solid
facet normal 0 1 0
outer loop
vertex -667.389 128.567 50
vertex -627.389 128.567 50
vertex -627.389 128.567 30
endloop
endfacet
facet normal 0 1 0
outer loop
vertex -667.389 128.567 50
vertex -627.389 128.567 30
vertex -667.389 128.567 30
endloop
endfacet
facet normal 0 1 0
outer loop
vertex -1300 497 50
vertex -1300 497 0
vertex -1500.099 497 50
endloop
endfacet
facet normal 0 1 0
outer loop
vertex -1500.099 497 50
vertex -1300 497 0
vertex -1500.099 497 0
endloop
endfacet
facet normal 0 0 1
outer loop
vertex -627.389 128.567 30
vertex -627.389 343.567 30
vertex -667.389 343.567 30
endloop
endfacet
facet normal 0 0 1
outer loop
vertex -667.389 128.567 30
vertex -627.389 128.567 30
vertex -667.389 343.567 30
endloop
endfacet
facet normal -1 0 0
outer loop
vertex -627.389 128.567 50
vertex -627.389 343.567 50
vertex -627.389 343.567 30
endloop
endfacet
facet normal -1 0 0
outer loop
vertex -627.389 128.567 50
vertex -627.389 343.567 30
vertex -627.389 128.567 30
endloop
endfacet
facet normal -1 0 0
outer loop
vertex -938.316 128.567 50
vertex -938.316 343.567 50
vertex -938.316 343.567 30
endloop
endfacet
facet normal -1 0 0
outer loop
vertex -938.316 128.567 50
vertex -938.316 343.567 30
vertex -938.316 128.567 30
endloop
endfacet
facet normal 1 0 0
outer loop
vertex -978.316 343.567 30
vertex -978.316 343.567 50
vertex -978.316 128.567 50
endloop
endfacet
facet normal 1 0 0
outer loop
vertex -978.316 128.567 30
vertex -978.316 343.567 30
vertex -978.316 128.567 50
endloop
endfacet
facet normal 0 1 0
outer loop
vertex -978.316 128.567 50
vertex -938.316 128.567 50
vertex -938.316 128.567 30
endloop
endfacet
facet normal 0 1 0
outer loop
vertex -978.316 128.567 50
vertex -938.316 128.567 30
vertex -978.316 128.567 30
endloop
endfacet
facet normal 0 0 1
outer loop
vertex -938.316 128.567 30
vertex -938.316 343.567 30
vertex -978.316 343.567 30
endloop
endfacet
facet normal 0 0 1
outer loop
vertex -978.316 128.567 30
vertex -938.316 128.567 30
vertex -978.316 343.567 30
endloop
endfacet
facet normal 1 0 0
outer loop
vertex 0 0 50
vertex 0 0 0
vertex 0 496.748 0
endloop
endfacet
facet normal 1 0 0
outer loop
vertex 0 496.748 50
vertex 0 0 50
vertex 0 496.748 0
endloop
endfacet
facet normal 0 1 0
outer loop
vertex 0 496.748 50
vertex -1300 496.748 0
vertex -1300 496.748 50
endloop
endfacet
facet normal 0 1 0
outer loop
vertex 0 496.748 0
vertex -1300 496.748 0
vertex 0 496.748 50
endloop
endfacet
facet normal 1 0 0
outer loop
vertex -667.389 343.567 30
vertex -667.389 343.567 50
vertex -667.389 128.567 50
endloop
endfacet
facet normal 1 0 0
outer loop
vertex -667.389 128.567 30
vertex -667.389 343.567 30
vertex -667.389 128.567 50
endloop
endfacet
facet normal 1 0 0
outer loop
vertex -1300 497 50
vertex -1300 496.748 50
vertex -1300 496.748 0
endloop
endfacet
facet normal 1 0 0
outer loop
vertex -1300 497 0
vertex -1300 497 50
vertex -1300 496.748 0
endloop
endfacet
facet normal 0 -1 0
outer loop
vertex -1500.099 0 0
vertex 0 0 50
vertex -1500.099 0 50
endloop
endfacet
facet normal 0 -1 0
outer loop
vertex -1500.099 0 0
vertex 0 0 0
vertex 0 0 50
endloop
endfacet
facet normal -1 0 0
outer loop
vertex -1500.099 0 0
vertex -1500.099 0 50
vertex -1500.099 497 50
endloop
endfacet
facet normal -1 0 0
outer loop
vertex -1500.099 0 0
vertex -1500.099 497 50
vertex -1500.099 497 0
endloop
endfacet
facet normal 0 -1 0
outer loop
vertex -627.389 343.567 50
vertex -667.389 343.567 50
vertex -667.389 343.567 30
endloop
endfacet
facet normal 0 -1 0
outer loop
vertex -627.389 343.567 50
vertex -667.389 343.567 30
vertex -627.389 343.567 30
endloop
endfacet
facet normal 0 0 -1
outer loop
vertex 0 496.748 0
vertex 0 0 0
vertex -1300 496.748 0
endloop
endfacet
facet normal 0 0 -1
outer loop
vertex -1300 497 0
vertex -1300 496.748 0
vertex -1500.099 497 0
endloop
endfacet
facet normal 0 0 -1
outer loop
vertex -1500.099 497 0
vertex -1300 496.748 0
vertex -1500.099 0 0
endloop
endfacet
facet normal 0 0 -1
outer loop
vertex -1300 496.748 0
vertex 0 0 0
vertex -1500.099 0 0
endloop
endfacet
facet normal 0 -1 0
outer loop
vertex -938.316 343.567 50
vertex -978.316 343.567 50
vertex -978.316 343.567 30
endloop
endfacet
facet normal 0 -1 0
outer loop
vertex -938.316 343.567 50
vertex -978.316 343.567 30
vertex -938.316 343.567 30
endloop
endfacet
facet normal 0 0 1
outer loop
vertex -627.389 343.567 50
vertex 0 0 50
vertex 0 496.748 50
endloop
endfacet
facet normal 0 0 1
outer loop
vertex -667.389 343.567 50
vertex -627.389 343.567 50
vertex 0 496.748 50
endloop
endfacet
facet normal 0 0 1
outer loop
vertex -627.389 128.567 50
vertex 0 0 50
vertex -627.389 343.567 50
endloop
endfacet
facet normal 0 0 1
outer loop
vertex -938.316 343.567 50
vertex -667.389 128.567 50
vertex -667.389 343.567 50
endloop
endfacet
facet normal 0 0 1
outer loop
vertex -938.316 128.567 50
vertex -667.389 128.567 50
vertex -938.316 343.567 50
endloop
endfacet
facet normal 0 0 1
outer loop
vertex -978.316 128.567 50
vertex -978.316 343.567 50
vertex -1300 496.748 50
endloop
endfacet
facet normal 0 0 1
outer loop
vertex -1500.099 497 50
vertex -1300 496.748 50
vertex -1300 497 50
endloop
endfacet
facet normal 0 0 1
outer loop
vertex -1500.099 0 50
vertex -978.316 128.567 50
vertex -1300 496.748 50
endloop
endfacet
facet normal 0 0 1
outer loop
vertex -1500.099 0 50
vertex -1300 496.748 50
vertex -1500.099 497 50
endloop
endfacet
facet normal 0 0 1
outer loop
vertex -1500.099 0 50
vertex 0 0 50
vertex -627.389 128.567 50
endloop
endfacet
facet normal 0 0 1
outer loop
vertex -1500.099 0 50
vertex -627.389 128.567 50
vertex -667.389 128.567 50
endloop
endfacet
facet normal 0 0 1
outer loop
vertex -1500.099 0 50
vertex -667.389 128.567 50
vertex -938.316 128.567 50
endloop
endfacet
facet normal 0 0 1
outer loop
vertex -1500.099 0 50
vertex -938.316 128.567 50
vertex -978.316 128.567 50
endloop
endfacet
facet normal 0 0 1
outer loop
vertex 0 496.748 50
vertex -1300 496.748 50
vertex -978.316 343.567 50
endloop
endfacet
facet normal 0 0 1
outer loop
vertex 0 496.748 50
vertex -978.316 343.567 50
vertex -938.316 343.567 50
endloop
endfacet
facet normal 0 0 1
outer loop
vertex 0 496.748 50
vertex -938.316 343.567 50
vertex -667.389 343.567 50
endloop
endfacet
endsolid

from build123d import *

# Parameters (mm, degrees)
SZKIC1_W                    = 1300
SZKIC1_H                    = 496.747706102
DODANIE_WYCI_GNI_CIE1_DEPTH = 50
WYTNIJ_WYCI_GNI_CIE1_DEPTH  = 30
SZKIC3_W                    = 200.09890069
SZKIC3_H                    = 50
DODANIE_WYCI_GNI_CIE2_DEPTH = 497


with BuildPart() as part:
    # Szkic1 → Dodanie-wyciągnięcie1 (new body)
    with BuildSketch(Plane.XY):
        with Locations((-650, 248.373853051)):
            Rectangle(SZKIC1_W, SZKIC1_H)
    extrude(amount=DODANIE_WYCI_GNI_CIE1_DEPTH)

    # Szkic2 → Wytnij-wyciągnięcie1 (cut)
    with BuildSketch(Plane.XY.offset(60)):
        Polygon((-978.316280033, 248.373853051), (-978.316280033, 343.566812888), (-938.316280033, 343.566812888), (-938.316280033, 128.566812888), (-978.316280033, 128.566812888), align=None)
        Polygon((-667.389420711, 248.373853051), (-667.389420711, 343.566812888), (-627.389420711, 343.566812888), (-627.389420711, 128.566812888), (-667.389420711, 128.566812888), align=None)
    extrude(amount=-WYTNIJ_WYCI_GNI_CIE1_DEPTH, mode=Mode.SUBTRACT)

    # Szkic3 → Dodanie-wyciągnięcie2 (add)
    with BuildSketch(Plane(origin=(0, 0, 0), x_dir=(-1, 0, 0), z_dir=(0, -1, 0))):
        with Locations((1400.049450345, -25)):
            Rectangle(SZKIC3_W, SZKIC3_H)
    extrude(amount=-DODANIE_WYCI_GNI_CIE2_DEPTH)


solid = part.part
